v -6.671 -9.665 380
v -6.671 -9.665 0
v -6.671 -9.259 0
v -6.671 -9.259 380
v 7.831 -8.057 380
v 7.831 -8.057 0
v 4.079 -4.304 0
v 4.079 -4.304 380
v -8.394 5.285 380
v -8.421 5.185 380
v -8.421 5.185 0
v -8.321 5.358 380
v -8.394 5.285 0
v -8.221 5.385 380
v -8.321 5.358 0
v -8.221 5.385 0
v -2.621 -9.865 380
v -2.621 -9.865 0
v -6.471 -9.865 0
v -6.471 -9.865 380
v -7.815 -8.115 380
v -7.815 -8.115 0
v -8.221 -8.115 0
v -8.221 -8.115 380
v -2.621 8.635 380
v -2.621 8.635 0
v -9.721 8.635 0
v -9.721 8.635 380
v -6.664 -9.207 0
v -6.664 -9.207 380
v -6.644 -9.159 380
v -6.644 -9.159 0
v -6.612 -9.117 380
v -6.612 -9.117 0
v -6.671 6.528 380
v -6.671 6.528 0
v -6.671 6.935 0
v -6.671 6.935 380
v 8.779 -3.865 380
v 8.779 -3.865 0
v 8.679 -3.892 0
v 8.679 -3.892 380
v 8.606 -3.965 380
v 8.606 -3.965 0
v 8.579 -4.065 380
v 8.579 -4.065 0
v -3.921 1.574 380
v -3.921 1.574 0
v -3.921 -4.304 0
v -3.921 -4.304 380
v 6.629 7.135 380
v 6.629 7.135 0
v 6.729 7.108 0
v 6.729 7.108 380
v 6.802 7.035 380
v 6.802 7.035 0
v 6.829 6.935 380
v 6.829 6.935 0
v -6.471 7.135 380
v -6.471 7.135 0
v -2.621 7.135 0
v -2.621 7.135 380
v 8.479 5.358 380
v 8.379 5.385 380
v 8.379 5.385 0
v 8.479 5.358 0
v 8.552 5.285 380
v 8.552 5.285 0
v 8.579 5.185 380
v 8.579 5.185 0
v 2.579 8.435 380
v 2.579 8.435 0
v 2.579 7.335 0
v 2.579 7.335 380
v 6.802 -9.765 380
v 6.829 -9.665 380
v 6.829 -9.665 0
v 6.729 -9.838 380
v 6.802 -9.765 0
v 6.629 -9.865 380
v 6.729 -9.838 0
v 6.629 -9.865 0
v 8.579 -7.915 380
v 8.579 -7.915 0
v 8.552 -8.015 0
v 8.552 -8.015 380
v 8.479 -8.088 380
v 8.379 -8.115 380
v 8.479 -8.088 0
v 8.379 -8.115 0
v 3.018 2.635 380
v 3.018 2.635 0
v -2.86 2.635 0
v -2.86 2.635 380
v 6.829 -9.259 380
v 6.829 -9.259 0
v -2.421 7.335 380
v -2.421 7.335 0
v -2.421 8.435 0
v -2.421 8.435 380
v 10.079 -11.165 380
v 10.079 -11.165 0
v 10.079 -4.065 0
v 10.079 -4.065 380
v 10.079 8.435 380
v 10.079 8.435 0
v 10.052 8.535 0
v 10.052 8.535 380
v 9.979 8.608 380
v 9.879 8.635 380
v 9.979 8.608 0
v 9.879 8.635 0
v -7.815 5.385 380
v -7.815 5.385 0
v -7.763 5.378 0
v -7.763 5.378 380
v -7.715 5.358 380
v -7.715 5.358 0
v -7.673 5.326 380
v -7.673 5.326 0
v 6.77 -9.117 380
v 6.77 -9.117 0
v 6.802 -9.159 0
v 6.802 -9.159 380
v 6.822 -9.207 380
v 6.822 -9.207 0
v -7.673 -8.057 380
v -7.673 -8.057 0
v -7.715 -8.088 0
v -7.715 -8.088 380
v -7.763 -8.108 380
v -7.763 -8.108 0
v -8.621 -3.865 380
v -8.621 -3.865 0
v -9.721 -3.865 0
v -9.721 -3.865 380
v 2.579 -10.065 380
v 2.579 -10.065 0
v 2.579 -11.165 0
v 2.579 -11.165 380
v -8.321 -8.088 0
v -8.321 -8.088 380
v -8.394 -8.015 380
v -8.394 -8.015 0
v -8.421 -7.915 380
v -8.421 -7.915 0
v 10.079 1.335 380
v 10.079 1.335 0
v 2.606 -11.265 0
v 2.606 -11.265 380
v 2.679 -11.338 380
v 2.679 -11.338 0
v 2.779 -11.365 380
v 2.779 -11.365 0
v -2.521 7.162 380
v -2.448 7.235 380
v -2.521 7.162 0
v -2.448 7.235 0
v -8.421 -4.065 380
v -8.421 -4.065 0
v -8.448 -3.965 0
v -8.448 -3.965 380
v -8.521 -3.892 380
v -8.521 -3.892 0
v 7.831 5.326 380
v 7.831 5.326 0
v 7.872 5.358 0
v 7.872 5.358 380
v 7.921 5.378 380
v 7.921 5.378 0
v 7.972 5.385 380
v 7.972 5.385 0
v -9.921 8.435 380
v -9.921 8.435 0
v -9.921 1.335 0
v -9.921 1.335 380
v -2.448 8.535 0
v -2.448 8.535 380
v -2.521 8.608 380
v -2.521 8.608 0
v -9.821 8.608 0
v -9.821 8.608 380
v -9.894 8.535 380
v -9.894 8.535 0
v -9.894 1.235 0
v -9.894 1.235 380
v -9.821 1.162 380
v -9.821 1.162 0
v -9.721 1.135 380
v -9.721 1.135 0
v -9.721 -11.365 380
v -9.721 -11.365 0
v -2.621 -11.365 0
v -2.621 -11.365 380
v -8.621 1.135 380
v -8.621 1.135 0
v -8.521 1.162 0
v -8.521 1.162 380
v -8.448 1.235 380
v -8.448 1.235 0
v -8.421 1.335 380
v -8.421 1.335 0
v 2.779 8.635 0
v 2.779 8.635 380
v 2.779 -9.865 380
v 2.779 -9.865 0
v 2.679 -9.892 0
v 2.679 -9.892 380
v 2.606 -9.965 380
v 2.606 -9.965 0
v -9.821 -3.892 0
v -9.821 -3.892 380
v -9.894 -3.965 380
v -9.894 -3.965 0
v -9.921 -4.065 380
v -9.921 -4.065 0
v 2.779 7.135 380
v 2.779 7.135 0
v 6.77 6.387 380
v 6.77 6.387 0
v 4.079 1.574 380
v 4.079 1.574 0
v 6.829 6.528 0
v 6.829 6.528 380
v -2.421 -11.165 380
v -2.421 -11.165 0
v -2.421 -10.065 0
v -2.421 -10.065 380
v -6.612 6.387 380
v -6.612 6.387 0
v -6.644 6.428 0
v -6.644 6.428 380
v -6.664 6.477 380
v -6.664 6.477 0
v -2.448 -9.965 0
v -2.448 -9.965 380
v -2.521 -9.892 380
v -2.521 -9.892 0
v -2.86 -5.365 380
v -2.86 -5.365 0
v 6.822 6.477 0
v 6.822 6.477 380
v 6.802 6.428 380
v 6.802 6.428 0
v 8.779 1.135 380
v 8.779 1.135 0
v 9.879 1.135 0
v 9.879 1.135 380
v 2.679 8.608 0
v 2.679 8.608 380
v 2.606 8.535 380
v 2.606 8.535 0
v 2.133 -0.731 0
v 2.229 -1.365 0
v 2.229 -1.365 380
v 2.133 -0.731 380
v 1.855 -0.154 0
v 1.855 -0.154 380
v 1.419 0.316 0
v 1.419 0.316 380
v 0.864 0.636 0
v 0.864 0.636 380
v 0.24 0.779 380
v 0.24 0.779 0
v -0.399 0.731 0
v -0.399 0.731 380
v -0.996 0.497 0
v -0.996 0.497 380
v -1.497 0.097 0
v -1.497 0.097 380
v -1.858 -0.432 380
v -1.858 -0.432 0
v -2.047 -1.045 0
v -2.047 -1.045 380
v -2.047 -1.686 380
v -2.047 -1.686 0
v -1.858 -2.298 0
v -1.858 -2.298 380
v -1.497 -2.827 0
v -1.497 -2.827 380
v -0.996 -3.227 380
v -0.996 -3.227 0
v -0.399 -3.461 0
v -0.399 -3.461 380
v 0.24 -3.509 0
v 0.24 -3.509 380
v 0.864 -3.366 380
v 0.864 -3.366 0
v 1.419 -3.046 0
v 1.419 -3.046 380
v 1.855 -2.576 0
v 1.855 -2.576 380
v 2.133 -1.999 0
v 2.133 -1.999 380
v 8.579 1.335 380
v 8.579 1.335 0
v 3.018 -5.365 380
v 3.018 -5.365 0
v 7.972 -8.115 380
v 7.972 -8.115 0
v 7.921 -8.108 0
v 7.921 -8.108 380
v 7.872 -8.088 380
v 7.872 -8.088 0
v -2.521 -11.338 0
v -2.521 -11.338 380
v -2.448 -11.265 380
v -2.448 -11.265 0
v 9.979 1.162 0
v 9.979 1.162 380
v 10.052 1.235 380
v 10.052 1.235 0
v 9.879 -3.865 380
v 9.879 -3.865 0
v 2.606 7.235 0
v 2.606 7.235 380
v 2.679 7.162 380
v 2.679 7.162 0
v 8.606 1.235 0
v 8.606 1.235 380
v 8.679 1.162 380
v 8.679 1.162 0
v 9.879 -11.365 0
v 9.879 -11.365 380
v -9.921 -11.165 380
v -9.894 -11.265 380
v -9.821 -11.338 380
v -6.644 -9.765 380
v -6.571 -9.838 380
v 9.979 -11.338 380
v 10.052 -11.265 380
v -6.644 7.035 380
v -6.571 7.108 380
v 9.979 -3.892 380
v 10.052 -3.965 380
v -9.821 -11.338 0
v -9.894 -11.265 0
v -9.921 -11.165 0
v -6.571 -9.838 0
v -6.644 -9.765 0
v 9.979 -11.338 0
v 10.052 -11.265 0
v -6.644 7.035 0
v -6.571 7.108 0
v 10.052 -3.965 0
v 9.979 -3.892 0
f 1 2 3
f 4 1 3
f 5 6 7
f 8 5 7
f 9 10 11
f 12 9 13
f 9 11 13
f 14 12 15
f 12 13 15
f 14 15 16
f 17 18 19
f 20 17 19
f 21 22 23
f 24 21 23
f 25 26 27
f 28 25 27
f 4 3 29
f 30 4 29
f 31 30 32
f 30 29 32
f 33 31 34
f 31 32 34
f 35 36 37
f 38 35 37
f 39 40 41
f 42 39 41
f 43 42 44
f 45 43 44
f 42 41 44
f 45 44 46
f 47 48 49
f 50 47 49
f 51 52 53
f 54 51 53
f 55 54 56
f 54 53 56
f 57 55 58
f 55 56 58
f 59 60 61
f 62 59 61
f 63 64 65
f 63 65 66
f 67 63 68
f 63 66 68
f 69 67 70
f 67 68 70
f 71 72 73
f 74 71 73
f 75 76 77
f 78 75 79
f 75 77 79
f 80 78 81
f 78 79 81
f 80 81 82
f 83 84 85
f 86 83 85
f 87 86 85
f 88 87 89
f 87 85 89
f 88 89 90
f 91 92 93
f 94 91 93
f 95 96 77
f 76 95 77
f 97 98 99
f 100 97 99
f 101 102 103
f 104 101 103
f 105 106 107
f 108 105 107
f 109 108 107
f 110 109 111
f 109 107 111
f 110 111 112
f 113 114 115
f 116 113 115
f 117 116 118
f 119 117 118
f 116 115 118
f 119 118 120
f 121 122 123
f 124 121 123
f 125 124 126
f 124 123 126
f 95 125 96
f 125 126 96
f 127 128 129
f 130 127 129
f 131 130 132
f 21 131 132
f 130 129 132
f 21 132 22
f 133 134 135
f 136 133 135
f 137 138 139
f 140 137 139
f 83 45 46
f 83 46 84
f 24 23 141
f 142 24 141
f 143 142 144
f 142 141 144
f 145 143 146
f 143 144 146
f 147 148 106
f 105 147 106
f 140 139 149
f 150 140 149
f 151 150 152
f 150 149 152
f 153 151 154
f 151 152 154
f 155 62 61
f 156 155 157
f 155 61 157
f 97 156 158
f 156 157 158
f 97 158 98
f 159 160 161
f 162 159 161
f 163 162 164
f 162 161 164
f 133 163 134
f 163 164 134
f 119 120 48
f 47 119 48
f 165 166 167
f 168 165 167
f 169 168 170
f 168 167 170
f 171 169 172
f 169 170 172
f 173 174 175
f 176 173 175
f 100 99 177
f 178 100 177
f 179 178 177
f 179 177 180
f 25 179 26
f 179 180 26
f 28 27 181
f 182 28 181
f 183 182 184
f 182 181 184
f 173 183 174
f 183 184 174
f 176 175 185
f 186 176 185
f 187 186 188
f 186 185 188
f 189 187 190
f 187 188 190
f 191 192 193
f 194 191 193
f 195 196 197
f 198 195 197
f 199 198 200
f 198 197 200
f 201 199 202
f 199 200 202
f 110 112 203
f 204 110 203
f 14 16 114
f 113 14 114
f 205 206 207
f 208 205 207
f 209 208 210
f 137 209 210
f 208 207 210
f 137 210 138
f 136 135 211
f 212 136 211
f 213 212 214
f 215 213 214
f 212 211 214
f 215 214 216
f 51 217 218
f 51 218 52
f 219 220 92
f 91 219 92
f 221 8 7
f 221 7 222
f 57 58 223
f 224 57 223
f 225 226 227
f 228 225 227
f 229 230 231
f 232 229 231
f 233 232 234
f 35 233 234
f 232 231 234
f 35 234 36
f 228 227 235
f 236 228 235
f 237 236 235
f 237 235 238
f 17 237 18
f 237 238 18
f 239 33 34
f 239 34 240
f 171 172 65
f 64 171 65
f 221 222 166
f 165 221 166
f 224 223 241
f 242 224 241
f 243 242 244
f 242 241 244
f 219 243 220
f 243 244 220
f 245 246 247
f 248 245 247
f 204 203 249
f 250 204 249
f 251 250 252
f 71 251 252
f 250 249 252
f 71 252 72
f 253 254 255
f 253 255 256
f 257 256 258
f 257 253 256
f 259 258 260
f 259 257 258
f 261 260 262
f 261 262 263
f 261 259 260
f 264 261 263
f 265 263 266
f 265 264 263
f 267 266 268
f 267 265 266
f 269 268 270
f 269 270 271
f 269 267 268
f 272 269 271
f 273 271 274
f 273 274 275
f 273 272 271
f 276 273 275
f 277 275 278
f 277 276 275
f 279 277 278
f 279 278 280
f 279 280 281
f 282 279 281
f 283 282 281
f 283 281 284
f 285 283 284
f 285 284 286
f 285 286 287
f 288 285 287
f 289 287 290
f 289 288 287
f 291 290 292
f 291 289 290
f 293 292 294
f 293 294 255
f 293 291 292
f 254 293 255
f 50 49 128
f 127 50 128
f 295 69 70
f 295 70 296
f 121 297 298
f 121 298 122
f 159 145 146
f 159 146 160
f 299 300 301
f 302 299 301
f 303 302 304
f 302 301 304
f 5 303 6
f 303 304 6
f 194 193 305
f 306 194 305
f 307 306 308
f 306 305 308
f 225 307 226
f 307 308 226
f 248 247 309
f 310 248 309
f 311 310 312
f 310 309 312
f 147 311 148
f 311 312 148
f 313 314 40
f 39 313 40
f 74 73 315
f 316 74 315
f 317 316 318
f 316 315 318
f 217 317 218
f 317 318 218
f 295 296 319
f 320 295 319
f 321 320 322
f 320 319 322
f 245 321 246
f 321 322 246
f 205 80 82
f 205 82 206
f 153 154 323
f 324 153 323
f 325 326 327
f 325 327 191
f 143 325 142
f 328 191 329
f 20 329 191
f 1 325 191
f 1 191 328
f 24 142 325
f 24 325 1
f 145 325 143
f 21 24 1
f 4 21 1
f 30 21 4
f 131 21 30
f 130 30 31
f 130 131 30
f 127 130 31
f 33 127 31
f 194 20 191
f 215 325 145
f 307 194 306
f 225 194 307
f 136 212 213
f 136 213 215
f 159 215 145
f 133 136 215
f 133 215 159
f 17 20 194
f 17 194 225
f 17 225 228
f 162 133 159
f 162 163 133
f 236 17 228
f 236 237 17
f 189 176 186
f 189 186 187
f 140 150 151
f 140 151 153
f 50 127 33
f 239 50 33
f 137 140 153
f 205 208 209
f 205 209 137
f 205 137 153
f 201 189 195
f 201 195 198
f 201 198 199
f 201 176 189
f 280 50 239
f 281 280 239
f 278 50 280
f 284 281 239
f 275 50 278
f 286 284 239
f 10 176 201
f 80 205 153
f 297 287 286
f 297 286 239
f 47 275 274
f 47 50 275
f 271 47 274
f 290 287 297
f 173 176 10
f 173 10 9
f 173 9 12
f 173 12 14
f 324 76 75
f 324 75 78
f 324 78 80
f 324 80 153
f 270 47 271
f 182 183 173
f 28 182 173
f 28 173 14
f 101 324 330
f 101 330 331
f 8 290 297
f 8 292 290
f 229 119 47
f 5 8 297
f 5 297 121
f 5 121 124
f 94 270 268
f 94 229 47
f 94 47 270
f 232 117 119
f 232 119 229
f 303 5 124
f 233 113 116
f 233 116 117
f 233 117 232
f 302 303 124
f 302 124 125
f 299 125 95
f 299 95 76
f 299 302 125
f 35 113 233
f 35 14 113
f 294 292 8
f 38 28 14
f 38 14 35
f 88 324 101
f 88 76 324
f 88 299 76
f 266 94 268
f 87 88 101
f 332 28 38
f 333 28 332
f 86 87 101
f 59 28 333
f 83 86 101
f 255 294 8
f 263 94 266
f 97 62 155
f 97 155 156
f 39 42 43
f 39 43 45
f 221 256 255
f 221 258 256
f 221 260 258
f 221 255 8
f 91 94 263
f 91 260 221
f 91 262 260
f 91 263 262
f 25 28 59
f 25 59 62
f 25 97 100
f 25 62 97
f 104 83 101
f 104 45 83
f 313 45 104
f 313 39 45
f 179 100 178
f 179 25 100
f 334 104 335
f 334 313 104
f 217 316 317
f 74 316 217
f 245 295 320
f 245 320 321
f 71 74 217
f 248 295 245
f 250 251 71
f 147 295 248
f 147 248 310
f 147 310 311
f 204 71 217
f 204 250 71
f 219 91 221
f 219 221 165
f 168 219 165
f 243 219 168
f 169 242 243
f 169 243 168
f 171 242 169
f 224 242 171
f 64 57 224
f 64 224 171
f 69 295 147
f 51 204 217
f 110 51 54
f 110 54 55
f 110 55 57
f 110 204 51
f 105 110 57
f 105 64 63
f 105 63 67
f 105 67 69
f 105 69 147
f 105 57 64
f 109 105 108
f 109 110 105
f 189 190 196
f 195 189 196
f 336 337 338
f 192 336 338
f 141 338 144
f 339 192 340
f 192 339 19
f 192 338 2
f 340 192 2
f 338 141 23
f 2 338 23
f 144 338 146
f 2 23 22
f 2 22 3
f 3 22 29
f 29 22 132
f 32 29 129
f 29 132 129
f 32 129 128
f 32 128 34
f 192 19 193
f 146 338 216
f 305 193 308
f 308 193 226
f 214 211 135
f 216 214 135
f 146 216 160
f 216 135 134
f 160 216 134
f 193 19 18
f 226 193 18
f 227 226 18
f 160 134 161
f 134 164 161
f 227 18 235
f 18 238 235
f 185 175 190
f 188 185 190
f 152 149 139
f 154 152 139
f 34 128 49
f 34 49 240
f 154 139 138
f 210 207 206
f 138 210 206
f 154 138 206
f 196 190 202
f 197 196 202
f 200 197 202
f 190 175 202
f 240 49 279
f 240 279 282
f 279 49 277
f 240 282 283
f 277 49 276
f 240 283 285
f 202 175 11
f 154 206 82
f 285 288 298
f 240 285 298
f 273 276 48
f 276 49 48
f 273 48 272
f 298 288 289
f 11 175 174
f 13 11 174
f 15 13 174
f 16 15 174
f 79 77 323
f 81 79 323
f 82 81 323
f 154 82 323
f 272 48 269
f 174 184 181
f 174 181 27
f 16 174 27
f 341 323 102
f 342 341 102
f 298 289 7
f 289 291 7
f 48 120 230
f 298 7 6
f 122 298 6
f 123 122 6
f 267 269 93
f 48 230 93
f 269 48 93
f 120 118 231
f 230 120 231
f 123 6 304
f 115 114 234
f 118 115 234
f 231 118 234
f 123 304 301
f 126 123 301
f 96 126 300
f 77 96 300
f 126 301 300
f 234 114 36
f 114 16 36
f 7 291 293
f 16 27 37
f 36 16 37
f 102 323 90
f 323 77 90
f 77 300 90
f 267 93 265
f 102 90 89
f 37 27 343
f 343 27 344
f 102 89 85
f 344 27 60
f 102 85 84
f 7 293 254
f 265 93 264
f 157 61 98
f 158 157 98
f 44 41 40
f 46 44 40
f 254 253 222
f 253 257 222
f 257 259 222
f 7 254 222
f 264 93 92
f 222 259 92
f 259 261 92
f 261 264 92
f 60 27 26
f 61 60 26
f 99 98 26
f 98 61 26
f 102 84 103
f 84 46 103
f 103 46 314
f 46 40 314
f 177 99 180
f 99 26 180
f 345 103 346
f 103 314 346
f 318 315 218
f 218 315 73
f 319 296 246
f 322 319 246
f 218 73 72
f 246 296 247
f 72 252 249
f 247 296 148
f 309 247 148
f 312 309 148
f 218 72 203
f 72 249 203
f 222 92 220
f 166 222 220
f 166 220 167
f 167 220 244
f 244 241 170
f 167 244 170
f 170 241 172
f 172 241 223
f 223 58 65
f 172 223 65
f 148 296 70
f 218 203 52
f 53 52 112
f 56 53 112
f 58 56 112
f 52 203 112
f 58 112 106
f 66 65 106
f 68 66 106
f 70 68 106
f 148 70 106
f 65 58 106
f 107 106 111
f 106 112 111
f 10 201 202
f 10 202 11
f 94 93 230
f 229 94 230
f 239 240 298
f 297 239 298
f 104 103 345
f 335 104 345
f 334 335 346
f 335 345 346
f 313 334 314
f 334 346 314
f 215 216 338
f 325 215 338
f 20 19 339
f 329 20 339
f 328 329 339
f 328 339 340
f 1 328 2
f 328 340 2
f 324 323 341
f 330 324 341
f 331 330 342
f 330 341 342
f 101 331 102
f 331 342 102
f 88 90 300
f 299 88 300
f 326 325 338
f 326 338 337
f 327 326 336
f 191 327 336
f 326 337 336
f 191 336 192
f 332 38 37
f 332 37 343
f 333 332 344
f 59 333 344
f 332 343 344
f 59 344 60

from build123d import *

# Parameters (mm, degrees)
F0_R     = 2.15
F1_DEPTH = 380


with BuildPart() as f1:
    # F0 (on Top) → F1 (new body)
    with BuildSketch(Plane.XY):
        with BuildLine():
            ThreePointArc((10.078947, 8.434901), (10.020369, 8.576322), (9.878947, 8.634901))
            Line((9.878947, 8.634901), (2.778947, 8.634901))
            ThreePointArc((2.778947, 8.634901), (2.637526, 8.576322), (2.578947, 8.434901))
            Line((2.578947, 8.434901), (2.578947, 7.334901))
            ThreePointArc((2.578947, 7.334901), (2.637526, 7.193479), (2.778947, 7.134901))
            Line((2.778947, 7.134901), (6.628947, 7.134901))
            ThreePointArc((6.628947, 7.134901), (6.770369, 7.076322), (6.828947, 6.934901))
            Line((6.828947, 6.934901), (6.828947, 6.528404))
            ThreePointArc((6.828947, 6.528404), (6.813723, 6.451867), (6.770369, 6.386982))
            Line((6.770369, 6.386982), (3.018287, 2.634901))
            Line((3.018287, 2.634901), (-2.860392, 2.634901))
            Line((-2.860392, 2.634901), (-6.612474, 6.386982))
            ThreePointArc((-6.612474, 6.386982), (-6.655829, 6.451867), (-6.671053, 6.528404))
            Line((-6.671053, 6.528404), (-6.671053, 6.934901))
            ThreePointArc((-6.671053, 6.934901), (-6.612474, 7.076322), (-6.471053, 7.134901))
            Line((-6.471053, 7.134901), (-2.621053, 7.134901))
            ThreePointArc((-2.621053, 7.134901), (-2.479631, 7.193479), (-2.421053, 7.334901))
            Line((-2.421053, 7.334901), (-2.421053, 8.434901))
            ThreePointArc((-2.421053, 8.434901), (-2.479631, 8.576322), (-2.621053, 8.634901))
            Line((-2.621053, 8.634901), (-9.721053, 8.634901))
            ThreePointArc((-9.721053, 8.634901), (-9.862474, 8.576322), (-9.921053, 8.434901))
            Line((-9.921053, 8.434901), (-9.921053, 1.334901))
            ThreePointArc((-9.921053, 1.334901), (-9.862474, 1.193479), (-9.721053, 1.134901))
            Line((-9.721053, 1.134901), (-8.621053, 1.134901))
            ThreePointArc((-8.621053, 1.134901), (-8.479631, 1.193479), (-8.421053, 1.334901))
            Line((-8.421053, 1.334901), (-8.421053, 5.184901))
            ThreePointArc((-8.421053, 5.184901), (-8.362474, 5.326322), (-8.221053, 5.384901))
            Line((-8.221053, 5.384901), (-7.814556, 5.384901))
            ThreePointArc((-7.814556, 5.384901), (-7.738019, 5.369677), (-7.673134, 5.326322))
            Line((-7.673134, 5.326322), (-3.921053, 1.574241))
            Line((-3.921053, 1.574241), (-3.921053, -4.304439))
            Line((-3.921053, -4.304439), (-7.673134, -8.056521))
            ThreePointArc((-7.673134, -8.056521), (-7.738019, -8.099875), (-7.814556, -8.115099))
            Line((-7.814556, -8.115099), (-8.221053, -8.115099))
            ThreePointArc((-8.221053, -8.115099), (-8.362474, -8.056521), (-8.421053, -7.915099))
            Line((-8.421053, -7.915099), (-8.421053, -4.065099))
            ThreePointArc((-8.421053, -4.065099), (-8.479631, -3.923678), (-8.621053, -3.865099))
            Line((-8.621053, -3.865099), (-9.721053, -3.865099))
            ThreePointArc((-9.721053, -3.865099), (-9.862474, -3.923678), (-9.921053, -4.065099))
            Line((-9.921053, -4.065099), (-9.921053, -11.165099))
            ThreePointArc((-9.921053, -11.165099), (-9.862474, -11.306521), (-9.721053, -11.365099))
            Line((-9.721053, -11.365099), (-2.621053, -11.365099))
            ThreePointArc((-2.621053, -11.365099), (-2.479631, -11.306521), (-2.421053, -11.165099))
            Line((-2.421053, -11.165099), (-2.421053, -10.065099))
            ThreePointArc((-2.421053, -10.065099), (-2.479631, -9.923678), (-2.621053, -9.865099))
            Line((-2.621053, -9.865099), (-6.471053, -9.865099))
            ThreePointArc((-6.471053, -9.865099), (-6.612474, -9.806521), (-6.671053, -9.665099))
            Line((-6.671053, -9.665099), (-6.671053, -9.258602))
            ThreePointArc((-6.671053, -9.258602), (-6.655829, -9.182065), (-6.612474, -9.117181))
            Line((-6.612474, -9.117181), (-2.860392, -5.365099))
            Line((-2.860392, -5.365099), (3.018287, -5.365099))
            Line((3.018287, -5.365099), (6.770369, -9.117181))
            ThreePointArc((6.770369, -9.117181), (6.813723, -9.182065), (6.828947, -9.258602))
            Line((6.828947, -9.258602), (6.828947, -9.665099))
            ThreePointArc((6.828947, -9.665099), (6.770369, -9.806521), (6.628947, -9.865099))
            Line((6.628947, -9.865099), (2.778947, -9.865099))
            ThreePointArc((2.778947, -9.865099), (2.637526, -9.923678), (2.578947, -10.065099))
            Line((2.578947, -10.065099), (2.578947, -11.165099))
            ThreePointArc((2.578947, -11.165099), (2.637526, -11.306521), (2.778947, -11.365099))
            Line((2.778947, -11.365099), (9.878947, -11.365099))
            ThreePointArc((9.878947, -11.365099), (10.020369, -11.306521), (10.078947, -11.165099))
            Line((10.078947, -11.165099), (10.078947, -4.065099))
            ThreePointArc((10.078947, -4.065099), (10.020369, -3.923678), (9.878947, -3.865099))
            Line((9.878947, -3.865099), (8.778947, -3.865099))
            ThreePointArc((8.778947, -3.865099), (8.637526, -3.923678), (8.578947, -4.065099))
            Line((8.578947, -4.065099), (8.578947, -7.915099))
            ThreePointArc((8.578947, -7.915099), (8.520369, -8.056521), (8.378947, -8.115099))
            Line((8.378947, -8.115099), (7.97245, -8.115099))
            ThreePointArc((7.97245, -8.115099), (7.895914, -8.099875), (7.831029, -8.056521))
            Line((7.831029, -8.056521), (4.078947, -4.304439))
            Line((4.078947, -4.304439), (4.078947, 1.574241))
            Line((4.078947, 1.574241), (7.831029, 5.326322))
            ThreePointArc((7.831029, 5.326322), (7.895914, 5.369677), (7.97245, 5.384901))
            Line((7.97245, 5.384901), (8.378947, 5.384901))
            ThreePointArc((8.378947, 5.384901), (8.520369, 5.326322), (8.578947, 5.184901))
            Line((8.578947, 5.184901), (8.578947, 1.334901))
            ThreePointArc((8.578947, 1.334901), (8.637526, 1.193479), (8.778947, 1.134901))
            Line((8.778947, 1.134901), (9.878947, 1.134901))
            ThreePointArc((9.878947, 1.134901), (10.020369, 1.193479), (10.078947, 1.334901))
            Line((10.078947, 1.334901), (10.078947, 8.434901))
        make_face()
        with Locations((0.078947, -1.365099)):
            Circle(F0_R, mode=Mode.SUBTRACT)
    extrude(amount=F1_DEPTH)


solid = f1.part
